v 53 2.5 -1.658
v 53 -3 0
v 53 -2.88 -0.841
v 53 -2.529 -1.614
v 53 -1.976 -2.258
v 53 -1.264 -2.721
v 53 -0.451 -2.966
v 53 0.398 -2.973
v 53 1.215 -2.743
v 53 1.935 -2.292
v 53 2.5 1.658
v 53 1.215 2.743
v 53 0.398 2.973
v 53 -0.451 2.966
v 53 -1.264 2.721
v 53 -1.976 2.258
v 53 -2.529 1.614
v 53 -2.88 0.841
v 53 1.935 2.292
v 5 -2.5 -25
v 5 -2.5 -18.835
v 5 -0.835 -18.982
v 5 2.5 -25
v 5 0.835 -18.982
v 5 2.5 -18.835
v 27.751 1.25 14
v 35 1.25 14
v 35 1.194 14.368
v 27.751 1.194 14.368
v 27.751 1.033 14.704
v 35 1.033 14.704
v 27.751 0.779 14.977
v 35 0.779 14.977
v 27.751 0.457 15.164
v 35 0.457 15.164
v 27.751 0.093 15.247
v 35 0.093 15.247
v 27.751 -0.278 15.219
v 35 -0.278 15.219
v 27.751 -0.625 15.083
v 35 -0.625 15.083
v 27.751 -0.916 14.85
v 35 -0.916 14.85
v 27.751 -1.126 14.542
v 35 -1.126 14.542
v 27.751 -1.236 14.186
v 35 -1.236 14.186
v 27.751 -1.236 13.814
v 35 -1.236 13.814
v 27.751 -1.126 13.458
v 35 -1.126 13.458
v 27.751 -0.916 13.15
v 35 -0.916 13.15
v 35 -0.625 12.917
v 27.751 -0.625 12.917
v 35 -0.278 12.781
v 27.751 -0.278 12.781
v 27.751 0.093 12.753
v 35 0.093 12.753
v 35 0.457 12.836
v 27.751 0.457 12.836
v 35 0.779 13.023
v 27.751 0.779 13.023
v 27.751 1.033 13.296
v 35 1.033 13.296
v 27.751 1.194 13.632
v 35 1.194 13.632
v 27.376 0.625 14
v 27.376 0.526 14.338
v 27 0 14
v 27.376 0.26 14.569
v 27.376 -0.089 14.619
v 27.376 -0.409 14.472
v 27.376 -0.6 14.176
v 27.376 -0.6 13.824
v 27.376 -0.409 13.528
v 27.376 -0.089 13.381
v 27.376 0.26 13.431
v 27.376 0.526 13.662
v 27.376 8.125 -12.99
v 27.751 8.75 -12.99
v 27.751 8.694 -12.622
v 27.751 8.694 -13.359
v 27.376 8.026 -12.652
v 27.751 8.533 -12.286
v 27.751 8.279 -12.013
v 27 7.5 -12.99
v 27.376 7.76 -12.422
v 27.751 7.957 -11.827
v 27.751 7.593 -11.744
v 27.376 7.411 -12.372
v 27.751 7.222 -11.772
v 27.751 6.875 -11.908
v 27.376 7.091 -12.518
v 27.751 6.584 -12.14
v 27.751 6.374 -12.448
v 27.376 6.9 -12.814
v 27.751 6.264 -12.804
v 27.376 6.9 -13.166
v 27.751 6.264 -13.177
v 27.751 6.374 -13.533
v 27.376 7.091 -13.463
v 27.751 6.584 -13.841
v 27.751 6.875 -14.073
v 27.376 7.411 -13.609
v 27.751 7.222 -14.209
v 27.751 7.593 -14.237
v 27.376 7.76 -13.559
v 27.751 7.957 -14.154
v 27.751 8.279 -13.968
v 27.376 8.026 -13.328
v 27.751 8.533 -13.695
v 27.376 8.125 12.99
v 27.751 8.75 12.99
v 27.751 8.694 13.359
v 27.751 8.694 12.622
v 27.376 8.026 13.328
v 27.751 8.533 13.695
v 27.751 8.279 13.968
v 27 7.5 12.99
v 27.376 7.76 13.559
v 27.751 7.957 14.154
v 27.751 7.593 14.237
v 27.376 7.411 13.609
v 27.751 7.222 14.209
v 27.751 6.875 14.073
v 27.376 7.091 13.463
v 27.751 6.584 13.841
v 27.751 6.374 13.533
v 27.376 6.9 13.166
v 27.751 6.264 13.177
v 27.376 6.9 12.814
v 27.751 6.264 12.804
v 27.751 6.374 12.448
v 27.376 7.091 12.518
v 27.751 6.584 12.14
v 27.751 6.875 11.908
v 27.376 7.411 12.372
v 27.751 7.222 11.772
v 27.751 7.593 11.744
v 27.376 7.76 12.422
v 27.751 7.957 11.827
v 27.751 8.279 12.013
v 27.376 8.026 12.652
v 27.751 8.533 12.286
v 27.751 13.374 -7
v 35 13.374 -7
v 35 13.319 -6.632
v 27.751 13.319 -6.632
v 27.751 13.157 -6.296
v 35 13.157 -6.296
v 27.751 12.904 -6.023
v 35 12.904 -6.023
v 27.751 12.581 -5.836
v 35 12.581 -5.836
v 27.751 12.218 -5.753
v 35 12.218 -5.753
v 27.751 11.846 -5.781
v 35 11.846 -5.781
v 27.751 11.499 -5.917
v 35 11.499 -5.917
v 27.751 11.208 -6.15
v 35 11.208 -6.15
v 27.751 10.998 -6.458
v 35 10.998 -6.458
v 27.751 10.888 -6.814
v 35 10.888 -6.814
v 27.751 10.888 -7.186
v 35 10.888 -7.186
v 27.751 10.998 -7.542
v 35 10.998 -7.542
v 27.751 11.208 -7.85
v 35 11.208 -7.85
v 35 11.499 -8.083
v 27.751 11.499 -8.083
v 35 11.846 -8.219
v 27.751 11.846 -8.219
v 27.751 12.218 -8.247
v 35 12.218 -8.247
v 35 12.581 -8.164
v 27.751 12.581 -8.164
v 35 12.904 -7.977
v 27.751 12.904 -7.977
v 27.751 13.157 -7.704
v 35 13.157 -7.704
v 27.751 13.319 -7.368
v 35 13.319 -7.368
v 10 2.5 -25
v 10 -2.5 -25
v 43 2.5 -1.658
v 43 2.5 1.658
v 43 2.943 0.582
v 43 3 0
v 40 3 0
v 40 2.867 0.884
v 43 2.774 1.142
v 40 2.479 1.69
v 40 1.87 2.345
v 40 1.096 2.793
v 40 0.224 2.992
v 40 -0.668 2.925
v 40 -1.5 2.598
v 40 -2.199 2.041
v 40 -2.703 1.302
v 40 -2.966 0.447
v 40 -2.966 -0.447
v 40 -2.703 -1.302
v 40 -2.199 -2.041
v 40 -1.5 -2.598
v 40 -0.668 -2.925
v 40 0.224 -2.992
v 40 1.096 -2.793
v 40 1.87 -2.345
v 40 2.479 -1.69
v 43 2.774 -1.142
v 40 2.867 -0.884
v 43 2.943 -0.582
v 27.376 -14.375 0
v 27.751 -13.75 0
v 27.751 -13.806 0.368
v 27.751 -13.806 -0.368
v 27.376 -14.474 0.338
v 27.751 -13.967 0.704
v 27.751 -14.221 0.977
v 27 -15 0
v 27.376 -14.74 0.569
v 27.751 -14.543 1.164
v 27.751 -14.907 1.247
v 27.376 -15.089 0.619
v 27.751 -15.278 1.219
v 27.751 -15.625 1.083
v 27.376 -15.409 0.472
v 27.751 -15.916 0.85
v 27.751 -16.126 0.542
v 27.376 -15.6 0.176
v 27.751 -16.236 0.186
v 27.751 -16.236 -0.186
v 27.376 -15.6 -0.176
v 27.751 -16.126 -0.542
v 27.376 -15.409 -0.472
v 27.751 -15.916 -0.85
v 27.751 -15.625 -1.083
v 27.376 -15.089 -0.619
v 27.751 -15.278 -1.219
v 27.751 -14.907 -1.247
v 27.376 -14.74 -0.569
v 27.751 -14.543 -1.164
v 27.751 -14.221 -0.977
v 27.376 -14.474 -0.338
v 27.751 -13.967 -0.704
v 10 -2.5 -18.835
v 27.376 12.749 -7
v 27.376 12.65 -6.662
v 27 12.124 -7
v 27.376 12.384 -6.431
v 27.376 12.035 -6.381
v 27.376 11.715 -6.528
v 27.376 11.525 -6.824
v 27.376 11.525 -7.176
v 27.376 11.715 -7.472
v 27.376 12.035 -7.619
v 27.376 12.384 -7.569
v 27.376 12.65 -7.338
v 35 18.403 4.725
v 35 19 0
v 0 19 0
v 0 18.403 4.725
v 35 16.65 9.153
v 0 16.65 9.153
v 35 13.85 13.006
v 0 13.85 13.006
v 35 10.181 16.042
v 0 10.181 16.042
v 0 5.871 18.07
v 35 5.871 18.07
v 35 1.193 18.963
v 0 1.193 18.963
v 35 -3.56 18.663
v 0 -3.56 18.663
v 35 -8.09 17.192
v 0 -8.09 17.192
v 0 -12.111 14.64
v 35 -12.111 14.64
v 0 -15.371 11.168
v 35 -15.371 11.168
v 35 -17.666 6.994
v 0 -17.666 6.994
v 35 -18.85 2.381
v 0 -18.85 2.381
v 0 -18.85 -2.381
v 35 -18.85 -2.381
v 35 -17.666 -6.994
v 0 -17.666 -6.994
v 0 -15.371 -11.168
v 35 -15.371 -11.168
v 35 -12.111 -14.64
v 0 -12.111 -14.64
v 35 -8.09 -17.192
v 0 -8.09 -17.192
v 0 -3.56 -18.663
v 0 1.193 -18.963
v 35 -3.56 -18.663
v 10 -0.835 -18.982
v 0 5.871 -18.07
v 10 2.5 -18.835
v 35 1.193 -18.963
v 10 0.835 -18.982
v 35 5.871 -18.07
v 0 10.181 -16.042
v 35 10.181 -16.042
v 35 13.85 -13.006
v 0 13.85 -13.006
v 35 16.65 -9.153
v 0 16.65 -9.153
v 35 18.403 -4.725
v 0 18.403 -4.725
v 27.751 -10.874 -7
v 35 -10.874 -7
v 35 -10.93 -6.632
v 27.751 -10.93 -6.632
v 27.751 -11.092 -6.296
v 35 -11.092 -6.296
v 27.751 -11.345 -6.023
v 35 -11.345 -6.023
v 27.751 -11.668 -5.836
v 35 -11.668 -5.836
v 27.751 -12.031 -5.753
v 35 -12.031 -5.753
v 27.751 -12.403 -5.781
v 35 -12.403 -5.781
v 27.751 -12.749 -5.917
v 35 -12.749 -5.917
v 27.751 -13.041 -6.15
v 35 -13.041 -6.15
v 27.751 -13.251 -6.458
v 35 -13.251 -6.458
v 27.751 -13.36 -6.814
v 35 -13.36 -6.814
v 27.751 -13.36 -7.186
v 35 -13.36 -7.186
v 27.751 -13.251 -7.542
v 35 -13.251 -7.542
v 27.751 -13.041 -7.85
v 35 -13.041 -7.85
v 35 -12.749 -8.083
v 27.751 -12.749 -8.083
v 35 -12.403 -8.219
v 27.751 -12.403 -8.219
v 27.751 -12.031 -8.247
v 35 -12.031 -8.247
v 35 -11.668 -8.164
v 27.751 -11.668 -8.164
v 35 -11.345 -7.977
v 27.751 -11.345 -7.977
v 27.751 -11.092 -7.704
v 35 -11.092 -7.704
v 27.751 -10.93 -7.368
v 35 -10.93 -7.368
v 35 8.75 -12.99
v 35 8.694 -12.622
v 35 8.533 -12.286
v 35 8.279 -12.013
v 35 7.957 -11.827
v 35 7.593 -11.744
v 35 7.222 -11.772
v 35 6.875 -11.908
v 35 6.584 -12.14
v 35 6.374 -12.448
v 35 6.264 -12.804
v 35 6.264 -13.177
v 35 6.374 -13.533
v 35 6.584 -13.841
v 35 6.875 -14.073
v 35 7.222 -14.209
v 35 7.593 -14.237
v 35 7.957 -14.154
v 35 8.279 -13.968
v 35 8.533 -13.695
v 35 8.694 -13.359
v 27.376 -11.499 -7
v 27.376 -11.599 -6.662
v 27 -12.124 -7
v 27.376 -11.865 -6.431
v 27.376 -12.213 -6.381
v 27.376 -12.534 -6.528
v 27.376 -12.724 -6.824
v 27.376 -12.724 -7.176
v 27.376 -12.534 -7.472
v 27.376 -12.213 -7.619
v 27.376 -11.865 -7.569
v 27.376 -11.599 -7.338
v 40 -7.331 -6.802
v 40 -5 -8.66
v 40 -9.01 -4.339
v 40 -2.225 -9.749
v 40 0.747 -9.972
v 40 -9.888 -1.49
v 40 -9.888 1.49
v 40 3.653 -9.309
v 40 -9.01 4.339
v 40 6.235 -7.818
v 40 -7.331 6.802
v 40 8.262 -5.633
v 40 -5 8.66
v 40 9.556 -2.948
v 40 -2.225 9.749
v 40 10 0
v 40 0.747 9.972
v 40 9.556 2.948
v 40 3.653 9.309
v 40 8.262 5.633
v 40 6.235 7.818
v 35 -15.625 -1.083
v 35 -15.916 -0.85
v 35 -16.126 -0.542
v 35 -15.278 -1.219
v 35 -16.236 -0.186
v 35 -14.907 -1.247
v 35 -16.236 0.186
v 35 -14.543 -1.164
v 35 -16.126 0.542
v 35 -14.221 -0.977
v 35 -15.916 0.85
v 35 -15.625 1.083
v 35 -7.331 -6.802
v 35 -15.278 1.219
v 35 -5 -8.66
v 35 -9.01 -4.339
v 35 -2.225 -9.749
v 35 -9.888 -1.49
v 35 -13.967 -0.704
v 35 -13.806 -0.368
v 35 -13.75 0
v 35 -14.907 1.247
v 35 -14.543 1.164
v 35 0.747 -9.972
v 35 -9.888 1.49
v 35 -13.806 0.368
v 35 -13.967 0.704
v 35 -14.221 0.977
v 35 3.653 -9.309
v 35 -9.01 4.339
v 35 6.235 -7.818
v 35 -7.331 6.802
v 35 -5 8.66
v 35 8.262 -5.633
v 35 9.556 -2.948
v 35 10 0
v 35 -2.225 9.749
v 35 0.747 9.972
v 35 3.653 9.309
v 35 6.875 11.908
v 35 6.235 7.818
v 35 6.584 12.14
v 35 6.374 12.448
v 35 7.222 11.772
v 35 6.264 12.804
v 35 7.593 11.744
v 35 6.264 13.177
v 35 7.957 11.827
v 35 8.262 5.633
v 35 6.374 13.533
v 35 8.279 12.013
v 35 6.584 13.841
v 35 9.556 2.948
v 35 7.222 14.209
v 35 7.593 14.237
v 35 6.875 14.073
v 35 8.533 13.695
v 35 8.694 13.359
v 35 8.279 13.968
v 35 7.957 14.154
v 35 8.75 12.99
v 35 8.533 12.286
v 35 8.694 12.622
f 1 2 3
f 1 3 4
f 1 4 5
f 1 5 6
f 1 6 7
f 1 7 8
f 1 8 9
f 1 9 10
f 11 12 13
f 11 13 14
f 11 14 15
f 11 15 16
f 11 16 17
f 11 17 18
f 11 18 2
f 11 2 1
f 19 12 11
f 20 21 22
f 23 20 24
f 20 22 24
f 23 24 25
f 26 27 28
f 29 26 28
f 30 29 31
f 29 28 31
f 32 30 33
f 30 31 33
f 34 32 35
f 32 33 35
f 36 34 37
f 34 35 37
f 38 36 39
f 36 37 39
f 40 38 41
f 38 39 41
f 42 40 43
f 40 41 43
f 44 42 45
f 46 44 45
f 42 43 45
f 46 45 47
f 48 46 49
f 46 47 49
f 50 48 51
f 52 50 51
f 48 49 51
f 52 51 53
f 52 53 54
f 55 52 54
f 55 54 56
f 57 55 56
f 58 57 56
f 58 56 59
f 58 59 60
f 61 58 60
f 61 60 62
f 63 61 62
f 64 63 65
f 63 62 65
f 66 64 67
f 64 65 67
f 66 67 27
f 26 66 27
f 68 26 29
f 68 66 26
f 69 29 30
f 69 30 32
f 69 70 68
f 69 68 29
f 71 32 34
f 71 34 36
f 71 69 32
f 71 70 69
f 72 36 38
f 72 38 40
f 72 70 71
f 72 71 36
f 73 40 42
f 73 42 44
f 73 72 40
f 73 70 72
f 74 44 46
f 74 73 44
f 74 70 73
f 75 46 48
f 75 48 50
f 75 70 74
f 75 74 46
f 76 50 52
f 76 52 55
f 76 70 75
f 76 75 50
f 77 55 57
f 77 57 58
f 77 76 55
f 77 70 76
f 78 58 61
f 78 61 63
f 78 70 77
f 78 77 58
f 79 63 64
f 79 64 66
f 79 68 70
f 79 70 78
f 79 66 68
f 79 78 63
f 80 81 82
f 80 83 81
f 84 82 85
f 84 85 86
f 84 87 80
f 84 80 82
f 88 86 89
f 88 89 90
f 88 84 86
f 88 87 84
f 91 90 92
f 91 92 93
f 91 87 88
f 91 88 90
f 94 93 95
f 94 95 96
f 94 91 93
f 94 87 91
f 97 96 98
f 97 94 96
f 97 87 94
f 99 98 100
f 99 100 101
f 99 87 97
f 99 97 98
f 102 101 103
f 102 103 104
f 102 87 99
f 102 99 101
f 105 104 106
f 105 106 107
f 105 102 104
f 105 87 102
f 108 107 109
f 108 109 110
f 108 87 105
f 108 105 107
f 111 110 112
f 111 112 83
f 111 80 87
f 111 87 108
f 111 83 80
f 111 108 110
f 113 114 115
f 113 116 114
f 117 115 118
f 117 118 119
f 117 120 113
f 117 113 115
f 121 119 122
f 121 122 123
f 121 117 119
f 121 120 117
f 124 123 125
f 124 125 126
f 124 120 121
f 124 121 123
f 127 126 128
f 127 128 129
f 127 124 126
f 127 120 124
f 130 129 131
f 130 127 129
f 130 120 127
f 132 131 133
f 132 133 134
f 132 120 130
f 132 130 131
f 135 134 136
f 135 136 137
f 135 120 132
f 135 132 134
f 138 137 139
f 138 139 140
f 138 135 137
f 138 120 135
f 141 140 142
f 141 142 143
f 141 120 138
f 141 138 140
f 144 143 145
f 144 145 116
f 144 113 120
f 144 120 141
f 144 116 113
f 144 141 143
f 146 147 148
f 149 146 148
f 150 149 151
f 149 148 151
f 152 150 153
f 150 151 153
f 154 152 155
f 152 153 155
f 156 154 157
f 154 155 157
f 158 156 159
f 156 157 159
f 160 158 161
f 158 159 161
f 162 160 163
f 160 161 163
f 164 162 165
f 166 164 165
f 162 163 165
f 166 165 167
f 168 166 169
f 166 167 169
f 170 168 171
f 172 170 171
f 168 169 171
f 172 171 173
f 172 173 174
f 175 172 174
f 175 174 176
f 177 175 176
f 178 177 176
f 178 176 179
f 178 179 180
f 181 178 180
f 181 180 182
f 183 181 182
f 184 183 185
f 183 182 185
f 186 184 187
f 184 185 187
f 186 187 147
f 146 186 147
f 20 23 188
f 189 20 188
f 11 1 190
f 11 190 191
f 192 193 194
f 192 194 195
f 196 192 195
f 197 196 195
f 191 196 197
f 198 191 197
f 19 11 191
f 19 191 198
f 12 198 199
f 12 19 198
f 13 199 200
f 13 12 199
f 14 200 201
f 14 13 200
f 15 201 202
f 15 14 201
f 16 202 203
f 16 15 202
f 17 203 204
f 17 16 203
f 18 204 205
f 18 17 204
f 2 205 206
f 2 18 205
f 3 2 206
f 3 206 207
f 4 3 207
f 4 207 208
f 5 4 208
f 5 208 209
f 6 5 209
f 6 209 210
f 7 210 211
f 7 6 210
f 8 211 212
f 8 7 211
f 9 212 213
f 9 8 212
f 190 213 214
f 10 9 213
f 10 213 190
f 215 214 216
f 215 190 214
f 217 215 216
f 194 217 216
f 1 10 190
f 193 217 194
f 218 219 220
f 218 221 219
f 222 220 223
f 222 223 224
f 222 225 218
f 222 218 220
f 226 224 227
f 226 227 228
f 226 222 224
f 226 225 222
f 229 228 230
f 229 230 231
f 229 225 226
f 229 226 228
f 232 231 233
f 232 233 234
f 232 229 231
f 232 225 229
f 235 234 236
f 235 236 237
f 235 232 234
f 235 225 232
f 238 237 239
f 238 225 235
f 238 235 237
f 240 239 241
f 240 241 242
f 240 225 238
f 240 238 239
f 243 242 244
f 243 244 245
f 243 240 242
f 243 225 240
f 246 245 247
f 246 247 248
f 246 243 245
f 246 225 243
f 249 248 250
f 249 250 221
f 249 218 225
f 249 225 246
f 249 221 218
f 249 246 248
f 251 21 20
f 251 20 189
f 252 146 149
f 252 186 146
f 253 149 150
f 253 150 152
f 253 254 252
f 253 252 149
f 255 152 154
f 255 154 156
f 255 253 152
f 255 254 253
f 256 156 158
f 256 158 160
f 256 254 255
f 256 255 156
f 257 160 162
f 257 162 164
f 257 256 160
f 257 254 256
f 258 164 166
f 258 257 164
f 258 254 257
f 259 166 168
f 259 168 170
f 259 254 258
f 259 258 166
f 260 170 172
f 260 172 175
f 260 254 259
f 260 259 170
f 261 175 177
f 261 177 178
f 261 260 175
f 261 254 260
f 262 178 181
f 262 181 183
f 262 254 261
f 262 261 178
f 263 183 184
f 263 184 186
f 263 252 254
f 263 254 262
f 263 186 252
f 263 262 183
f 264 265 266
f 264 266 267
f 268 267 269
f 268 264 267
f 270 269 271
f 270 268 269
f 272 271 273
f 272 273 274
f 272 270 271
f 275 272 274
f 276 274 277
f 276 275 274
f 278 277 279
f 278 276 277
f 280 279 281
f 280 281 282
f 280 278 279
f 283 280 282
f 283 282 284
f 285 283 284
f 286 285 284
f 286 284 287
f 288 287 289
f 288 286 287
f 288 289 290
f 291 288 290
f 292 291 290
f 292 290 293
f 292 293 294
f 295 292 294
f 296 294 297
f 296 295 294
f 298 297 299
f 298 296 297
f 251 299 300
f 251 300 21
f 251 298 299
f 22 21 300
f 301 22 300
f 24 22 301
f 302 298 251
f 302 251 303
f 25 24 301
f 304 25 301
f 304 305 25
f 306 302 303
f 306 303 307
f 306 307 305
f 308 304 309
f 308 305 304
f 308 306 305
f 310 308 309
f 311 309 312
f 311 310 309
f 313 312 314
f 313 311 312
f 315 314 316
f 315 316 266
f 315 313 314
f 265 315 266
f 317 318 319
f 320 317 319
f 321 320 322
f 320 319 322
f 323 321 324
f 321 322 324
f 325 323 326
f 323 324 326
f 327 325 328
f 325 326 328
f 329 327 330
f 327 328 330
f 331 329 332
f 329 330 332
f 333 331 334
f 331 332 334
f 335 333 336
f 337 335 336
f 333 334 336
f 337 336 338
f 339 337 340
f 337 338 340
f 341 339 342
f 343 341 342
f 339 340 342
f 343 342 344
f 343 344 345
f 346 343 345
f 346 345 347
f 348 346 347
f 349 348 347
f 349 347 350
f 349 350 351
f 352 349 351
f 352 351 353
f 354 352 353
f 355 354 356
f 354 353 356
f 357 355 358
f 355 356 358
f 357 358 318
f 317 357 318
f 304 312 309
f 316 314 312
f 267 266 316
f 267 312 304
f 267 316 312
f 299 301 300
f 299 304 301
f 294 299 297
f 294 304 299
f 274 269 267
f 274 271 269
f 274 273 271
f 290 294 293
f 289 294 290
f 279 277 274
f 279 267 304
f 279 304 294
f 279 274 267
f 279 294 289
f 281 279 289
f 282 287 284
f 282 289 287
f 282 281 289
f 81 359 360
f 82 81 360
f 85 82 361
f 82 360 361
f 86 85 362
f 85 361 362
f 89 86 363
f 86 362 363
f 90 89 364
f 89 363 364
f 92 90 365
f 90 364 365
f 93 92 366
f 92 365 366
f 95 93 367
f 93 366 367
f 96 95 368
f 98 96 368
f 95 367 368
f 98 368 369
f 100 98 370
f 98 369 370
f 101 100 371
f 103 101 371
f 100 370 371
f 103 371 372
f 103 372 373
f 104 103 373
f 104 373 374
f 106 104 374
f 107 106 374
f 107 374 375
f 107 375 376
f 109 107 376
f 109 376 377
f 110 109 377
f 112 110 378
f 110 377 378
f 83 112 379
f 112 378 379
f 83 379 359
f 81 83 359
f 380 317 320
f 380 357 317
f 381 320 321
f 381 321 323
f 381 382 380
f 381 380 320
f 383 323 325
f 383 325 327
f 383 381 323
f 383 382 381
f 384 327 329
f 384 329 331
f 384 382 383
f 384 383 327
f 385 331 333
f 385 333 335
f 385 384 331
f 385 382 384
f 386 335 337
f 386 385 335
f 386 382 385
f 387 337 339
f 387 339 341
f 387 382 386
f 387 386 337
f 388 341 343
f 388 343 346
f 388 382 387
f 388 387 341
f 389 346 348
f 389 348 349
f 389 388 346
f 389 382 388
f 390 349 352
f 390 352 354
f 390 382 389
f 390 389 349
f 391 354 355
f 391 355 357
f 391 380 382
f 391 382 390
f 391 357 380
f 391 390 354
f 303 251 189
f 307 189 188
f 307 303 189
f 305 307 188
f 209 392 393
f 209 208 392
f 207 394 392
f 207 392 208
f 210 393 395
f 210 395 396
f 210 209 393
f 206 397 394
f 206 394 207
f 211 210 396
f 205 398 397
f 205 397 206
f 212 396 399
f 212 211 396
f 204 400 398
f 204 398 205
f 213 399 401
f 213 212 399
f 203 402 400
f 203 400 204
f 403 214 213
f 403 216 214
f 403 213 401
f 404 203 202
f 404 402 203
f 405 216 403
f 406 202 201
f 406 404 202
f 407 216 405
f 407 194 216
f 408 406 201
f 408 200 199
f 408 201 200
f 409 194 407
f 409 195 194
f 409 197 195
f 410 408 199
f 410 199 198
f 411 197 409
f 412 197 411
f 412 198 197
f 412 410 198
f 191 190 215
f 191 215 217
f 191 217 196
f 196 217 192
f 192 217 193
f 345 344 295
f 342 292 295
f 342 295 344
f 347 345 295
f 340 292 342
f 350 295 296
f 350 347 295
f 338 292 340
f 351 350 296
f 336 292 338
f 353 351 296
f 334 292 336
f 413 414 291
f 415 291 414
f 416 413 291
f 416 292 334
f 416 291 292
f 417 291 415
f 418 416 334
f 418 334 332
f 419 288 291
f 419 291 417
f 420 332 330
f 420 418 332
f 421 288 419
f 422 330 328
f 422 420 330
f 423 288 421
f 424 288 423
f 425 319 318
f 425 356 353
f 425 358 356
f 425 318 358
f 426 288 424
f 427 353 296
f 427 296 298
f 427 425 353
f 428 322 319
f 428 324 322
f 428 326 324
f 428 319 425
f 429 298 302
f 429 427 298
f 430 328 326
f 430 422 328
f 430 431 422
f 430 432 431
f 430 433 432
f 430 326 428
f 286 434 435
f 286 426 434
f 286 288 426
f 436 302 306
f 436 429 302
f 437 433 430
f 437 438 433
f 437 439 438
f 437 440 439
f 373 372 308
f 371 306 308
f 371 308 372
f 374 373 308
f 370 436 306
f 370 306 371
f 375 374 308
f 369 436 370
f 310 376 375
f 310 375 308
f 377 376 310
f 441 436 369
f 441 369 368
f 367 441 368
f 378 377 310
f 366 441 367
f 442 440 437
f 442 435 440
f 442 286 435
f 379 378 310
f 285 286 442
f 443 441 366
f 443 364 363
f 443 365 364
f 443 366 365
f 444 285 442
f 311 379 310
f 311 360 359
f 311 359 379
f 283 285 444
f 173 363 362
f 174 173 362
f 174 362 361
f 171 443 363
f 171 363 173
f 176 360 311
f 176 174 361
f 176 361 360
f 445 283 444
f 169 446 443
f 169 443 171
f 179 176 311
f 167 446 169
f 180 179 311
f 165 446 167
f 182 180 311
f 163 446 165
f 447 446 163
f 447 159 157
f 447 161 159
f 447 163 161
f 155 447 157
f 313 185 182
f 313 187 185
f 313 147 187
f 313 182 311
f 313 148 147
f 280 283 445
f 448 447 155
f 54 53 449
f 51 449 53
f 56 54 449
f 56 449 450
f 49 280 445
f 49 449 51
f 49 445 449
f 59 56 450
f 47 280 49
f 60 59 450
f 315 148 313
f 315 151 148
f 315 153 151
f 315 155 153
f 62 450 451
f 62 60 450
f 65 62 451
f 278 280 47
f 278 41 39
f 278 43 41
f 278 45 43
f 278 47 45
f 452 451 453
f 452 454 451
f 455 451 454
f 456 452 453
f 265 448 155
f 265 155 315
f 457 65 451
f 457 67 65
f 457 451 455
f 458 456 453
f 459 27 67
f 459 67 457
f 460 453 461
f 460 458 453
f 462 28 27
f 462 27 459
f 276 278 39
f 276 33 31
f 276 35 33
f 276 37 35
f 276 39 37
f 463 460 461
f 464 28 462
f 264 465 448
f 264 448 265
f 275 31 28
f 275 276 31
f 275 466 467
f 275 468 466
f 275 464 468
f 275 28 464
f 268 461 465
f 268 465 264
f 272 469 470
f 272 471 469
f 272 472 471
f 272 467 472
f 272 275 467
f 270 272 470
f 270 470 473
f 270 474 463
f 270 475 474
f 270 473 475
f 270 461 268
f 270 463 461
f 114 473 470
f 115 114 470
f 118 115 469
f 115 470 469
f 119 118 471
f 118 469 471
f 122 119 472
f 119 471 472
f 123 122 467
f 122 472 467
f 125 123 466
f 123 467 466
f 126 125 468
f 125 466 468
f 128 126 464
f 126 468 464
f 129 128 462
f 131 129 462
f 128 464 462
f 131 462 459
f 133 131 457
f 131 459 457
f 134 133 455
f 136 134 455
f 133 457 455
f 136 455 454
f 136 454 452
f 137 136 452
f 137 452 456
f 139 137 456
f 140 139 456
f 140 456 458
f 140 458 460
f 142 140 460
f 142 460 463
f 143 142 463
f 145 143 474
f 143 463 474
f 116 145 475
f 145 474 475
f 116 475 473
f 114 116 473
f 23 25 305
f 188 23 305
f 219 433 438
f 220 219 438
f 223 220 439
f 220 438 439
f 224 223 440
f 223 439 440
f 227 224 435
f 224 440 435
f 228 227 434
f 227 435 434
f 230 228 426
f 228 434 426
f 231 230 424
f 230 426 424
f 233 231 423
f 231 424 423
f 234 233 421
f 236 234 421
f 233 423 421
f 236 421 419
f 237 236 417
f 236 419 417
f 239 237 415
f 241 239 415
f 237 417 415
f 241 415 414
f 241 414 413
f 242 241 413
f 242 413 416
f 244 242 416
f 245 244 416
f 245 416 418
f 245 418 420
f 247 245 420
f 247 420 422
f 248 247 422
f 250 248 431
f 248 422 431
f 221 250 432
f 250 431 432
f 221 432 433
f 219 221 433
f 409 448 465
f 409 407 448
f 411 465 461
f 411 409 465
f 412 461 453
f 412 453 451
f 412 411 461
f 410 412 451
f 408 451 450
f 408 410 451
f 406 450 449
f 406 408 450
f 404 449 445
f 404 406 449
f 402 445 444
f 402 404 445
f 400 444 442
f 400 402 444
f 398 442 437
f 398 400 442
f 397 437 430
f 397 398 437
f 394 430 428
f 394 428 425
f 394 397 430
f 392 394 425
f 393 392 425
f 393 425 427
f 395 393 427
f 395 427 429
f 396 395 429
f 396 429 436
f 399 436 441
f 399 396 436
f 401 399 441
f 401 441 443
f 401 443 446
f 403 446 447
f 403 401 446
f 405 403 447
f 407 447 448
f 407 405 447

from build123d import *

# Parameters (mm, degrees)
SKETCH001_R  = 1.25
HOLE_DEPTH   = 7.248924
HOLE_TIPS_R  = 1.25
SKETCH002_W  = 20
SKETCH002_H  = 20
POCKET_DEPTH = 10
SKETCH003_W  = 5
SKETCH003_H  = 5
PAD_DEPTH    = 25


with BuildPart() as part:
    # Sketch → Revolution (revolve)
    with BuildSketch(Plane.XY):
        Polygon((0, 0), (0, 19), (35, 19), (35, 10), (40, 10), (40, 3), (53, 3), (53, 0), align=None)
    revolve(axis=Axis((0, 0, 0), (1, 0, 0)))

    # Sketch001 (on Face3 of Revolution) → Hole (cut)
    with BuildSketch(Plane.YZ.offset(35)):
        with Locations((-15, 0)):
            Circle(SKETCH001_R)
        with Locations((-12.124356, -7)):
            Circle(SKETCH001_R)
        with Locations((7.5, -12.990381)):
            Circle(SKETCH001_R)
        with Locations((12.124356, -7)):
            Circle(SKETCH001_R)
        with Locations((7.5, 12.990381)):
            Circle(SKETCH001_R)
        with Locations((0, 14)):
            Circle(SKETCH001_R)
    extrude(amount=-HOLE_DEPTH, mode=Mode.SUBTRACT)

    # Hole tips → Hole tip 1 section 0
    with BuildSketch(Plane.YZ.offset(27.751076), mode=Mode.PRIVATE) as hole_tip_1_s0:
        with Locations((-15, 0)):
            Circle(HOLE_TIPS_R)
    loft([hole_tip_1_s0.sketch, Vertex(27, -15, 0)], mode=Mode.SUBTRACT)

    # Hole tips → Hole tip 2 section 0
    with BuildSketch(Plane.YZ.offset(27.751076), mode=Mode.PRIVATE) as hole_tip_2_s0:
        with Locations((-12.124356, -7)):
            Circle(HOLE_TIPS_R)
    loft([hole_tip_2_s0.sketch, Vertex(27, -12.124356, -7)], mode=Mode.SUBTRACT)

    # Hole tips → Hole tip 3 section 0
    with BuildSketch(Plane.YZ.offset(27.751076), mode=Mode.PRIVATE) as hole_tip_3_s0:
        with Locations((7.5, -12.990381)):
            Circle(HOLE_TIPS_R)
    loft([hole_tip_3_s0.sketch, Vertex(27, 7.5, -12.990381)], mode=Mode.SUBTRACT)

    # Hole tips → Hole tip 4 section 0
    with BuildSketch(Plane.YZ.offset(27.751076), mode=Mode.PRIVATE) as hole_tip_4_s0:
        with Locations((12.124356, -7)):
            Circle(HOLE_TIPS_R)
    loft([hole_tip_4_s0.sketch, Vertex(27, 12.124356, -7)], mode=Mode.SUBTRACT)

    # Hole tips → Hole tip 5 section 0
    with BuildSketch(Plane.YZ.offset(27.751076), mode=Mode.PRIVATE) as hole_tip_5_s0:
        with Locations((7.5, 12.990381)):
            Circle(HOLE_TIPS_R)
    loft([hole_tip_5_s0.sketch, Vertex(27, 7.5, 12.990381)], mode=Mode.SUBTRACT)

    # Hole tips → Hole tip 6 section 0
    with BuildSketch(Plane.YZ.offset(27.751076), mode=Mode.PRIVATE) as hole_tip_6_s0:
        with Locations((0, 14)):
            Circle(HOLE_TIPS_R)
    loft([hole_tip_6_s0.sketch, Vertex(27, 0, 14)], mode=Mode.SUBTRACT)

    # Sketch002 (on Face19 of Hole) → Pocket (cut)
    with BuildSketch(Plane.YZ.offset(53)):
        with Locations((12.5, 0)):
            Rectangle(SKETCH002_W, SKETCH002_H)
    extrude(amount=-POCKET_DEPTH, mode=Mode.SUBTRACT)

    # Sketch003 → Pad (join)
    with BuildSketch(Plane.XY):
        with Locations((7.5, 0)):
            Rectangle(SKETCH003_W, SKETCH003_H)
    extrude(amount=-PAD_DEPTH)


solid = part.part
